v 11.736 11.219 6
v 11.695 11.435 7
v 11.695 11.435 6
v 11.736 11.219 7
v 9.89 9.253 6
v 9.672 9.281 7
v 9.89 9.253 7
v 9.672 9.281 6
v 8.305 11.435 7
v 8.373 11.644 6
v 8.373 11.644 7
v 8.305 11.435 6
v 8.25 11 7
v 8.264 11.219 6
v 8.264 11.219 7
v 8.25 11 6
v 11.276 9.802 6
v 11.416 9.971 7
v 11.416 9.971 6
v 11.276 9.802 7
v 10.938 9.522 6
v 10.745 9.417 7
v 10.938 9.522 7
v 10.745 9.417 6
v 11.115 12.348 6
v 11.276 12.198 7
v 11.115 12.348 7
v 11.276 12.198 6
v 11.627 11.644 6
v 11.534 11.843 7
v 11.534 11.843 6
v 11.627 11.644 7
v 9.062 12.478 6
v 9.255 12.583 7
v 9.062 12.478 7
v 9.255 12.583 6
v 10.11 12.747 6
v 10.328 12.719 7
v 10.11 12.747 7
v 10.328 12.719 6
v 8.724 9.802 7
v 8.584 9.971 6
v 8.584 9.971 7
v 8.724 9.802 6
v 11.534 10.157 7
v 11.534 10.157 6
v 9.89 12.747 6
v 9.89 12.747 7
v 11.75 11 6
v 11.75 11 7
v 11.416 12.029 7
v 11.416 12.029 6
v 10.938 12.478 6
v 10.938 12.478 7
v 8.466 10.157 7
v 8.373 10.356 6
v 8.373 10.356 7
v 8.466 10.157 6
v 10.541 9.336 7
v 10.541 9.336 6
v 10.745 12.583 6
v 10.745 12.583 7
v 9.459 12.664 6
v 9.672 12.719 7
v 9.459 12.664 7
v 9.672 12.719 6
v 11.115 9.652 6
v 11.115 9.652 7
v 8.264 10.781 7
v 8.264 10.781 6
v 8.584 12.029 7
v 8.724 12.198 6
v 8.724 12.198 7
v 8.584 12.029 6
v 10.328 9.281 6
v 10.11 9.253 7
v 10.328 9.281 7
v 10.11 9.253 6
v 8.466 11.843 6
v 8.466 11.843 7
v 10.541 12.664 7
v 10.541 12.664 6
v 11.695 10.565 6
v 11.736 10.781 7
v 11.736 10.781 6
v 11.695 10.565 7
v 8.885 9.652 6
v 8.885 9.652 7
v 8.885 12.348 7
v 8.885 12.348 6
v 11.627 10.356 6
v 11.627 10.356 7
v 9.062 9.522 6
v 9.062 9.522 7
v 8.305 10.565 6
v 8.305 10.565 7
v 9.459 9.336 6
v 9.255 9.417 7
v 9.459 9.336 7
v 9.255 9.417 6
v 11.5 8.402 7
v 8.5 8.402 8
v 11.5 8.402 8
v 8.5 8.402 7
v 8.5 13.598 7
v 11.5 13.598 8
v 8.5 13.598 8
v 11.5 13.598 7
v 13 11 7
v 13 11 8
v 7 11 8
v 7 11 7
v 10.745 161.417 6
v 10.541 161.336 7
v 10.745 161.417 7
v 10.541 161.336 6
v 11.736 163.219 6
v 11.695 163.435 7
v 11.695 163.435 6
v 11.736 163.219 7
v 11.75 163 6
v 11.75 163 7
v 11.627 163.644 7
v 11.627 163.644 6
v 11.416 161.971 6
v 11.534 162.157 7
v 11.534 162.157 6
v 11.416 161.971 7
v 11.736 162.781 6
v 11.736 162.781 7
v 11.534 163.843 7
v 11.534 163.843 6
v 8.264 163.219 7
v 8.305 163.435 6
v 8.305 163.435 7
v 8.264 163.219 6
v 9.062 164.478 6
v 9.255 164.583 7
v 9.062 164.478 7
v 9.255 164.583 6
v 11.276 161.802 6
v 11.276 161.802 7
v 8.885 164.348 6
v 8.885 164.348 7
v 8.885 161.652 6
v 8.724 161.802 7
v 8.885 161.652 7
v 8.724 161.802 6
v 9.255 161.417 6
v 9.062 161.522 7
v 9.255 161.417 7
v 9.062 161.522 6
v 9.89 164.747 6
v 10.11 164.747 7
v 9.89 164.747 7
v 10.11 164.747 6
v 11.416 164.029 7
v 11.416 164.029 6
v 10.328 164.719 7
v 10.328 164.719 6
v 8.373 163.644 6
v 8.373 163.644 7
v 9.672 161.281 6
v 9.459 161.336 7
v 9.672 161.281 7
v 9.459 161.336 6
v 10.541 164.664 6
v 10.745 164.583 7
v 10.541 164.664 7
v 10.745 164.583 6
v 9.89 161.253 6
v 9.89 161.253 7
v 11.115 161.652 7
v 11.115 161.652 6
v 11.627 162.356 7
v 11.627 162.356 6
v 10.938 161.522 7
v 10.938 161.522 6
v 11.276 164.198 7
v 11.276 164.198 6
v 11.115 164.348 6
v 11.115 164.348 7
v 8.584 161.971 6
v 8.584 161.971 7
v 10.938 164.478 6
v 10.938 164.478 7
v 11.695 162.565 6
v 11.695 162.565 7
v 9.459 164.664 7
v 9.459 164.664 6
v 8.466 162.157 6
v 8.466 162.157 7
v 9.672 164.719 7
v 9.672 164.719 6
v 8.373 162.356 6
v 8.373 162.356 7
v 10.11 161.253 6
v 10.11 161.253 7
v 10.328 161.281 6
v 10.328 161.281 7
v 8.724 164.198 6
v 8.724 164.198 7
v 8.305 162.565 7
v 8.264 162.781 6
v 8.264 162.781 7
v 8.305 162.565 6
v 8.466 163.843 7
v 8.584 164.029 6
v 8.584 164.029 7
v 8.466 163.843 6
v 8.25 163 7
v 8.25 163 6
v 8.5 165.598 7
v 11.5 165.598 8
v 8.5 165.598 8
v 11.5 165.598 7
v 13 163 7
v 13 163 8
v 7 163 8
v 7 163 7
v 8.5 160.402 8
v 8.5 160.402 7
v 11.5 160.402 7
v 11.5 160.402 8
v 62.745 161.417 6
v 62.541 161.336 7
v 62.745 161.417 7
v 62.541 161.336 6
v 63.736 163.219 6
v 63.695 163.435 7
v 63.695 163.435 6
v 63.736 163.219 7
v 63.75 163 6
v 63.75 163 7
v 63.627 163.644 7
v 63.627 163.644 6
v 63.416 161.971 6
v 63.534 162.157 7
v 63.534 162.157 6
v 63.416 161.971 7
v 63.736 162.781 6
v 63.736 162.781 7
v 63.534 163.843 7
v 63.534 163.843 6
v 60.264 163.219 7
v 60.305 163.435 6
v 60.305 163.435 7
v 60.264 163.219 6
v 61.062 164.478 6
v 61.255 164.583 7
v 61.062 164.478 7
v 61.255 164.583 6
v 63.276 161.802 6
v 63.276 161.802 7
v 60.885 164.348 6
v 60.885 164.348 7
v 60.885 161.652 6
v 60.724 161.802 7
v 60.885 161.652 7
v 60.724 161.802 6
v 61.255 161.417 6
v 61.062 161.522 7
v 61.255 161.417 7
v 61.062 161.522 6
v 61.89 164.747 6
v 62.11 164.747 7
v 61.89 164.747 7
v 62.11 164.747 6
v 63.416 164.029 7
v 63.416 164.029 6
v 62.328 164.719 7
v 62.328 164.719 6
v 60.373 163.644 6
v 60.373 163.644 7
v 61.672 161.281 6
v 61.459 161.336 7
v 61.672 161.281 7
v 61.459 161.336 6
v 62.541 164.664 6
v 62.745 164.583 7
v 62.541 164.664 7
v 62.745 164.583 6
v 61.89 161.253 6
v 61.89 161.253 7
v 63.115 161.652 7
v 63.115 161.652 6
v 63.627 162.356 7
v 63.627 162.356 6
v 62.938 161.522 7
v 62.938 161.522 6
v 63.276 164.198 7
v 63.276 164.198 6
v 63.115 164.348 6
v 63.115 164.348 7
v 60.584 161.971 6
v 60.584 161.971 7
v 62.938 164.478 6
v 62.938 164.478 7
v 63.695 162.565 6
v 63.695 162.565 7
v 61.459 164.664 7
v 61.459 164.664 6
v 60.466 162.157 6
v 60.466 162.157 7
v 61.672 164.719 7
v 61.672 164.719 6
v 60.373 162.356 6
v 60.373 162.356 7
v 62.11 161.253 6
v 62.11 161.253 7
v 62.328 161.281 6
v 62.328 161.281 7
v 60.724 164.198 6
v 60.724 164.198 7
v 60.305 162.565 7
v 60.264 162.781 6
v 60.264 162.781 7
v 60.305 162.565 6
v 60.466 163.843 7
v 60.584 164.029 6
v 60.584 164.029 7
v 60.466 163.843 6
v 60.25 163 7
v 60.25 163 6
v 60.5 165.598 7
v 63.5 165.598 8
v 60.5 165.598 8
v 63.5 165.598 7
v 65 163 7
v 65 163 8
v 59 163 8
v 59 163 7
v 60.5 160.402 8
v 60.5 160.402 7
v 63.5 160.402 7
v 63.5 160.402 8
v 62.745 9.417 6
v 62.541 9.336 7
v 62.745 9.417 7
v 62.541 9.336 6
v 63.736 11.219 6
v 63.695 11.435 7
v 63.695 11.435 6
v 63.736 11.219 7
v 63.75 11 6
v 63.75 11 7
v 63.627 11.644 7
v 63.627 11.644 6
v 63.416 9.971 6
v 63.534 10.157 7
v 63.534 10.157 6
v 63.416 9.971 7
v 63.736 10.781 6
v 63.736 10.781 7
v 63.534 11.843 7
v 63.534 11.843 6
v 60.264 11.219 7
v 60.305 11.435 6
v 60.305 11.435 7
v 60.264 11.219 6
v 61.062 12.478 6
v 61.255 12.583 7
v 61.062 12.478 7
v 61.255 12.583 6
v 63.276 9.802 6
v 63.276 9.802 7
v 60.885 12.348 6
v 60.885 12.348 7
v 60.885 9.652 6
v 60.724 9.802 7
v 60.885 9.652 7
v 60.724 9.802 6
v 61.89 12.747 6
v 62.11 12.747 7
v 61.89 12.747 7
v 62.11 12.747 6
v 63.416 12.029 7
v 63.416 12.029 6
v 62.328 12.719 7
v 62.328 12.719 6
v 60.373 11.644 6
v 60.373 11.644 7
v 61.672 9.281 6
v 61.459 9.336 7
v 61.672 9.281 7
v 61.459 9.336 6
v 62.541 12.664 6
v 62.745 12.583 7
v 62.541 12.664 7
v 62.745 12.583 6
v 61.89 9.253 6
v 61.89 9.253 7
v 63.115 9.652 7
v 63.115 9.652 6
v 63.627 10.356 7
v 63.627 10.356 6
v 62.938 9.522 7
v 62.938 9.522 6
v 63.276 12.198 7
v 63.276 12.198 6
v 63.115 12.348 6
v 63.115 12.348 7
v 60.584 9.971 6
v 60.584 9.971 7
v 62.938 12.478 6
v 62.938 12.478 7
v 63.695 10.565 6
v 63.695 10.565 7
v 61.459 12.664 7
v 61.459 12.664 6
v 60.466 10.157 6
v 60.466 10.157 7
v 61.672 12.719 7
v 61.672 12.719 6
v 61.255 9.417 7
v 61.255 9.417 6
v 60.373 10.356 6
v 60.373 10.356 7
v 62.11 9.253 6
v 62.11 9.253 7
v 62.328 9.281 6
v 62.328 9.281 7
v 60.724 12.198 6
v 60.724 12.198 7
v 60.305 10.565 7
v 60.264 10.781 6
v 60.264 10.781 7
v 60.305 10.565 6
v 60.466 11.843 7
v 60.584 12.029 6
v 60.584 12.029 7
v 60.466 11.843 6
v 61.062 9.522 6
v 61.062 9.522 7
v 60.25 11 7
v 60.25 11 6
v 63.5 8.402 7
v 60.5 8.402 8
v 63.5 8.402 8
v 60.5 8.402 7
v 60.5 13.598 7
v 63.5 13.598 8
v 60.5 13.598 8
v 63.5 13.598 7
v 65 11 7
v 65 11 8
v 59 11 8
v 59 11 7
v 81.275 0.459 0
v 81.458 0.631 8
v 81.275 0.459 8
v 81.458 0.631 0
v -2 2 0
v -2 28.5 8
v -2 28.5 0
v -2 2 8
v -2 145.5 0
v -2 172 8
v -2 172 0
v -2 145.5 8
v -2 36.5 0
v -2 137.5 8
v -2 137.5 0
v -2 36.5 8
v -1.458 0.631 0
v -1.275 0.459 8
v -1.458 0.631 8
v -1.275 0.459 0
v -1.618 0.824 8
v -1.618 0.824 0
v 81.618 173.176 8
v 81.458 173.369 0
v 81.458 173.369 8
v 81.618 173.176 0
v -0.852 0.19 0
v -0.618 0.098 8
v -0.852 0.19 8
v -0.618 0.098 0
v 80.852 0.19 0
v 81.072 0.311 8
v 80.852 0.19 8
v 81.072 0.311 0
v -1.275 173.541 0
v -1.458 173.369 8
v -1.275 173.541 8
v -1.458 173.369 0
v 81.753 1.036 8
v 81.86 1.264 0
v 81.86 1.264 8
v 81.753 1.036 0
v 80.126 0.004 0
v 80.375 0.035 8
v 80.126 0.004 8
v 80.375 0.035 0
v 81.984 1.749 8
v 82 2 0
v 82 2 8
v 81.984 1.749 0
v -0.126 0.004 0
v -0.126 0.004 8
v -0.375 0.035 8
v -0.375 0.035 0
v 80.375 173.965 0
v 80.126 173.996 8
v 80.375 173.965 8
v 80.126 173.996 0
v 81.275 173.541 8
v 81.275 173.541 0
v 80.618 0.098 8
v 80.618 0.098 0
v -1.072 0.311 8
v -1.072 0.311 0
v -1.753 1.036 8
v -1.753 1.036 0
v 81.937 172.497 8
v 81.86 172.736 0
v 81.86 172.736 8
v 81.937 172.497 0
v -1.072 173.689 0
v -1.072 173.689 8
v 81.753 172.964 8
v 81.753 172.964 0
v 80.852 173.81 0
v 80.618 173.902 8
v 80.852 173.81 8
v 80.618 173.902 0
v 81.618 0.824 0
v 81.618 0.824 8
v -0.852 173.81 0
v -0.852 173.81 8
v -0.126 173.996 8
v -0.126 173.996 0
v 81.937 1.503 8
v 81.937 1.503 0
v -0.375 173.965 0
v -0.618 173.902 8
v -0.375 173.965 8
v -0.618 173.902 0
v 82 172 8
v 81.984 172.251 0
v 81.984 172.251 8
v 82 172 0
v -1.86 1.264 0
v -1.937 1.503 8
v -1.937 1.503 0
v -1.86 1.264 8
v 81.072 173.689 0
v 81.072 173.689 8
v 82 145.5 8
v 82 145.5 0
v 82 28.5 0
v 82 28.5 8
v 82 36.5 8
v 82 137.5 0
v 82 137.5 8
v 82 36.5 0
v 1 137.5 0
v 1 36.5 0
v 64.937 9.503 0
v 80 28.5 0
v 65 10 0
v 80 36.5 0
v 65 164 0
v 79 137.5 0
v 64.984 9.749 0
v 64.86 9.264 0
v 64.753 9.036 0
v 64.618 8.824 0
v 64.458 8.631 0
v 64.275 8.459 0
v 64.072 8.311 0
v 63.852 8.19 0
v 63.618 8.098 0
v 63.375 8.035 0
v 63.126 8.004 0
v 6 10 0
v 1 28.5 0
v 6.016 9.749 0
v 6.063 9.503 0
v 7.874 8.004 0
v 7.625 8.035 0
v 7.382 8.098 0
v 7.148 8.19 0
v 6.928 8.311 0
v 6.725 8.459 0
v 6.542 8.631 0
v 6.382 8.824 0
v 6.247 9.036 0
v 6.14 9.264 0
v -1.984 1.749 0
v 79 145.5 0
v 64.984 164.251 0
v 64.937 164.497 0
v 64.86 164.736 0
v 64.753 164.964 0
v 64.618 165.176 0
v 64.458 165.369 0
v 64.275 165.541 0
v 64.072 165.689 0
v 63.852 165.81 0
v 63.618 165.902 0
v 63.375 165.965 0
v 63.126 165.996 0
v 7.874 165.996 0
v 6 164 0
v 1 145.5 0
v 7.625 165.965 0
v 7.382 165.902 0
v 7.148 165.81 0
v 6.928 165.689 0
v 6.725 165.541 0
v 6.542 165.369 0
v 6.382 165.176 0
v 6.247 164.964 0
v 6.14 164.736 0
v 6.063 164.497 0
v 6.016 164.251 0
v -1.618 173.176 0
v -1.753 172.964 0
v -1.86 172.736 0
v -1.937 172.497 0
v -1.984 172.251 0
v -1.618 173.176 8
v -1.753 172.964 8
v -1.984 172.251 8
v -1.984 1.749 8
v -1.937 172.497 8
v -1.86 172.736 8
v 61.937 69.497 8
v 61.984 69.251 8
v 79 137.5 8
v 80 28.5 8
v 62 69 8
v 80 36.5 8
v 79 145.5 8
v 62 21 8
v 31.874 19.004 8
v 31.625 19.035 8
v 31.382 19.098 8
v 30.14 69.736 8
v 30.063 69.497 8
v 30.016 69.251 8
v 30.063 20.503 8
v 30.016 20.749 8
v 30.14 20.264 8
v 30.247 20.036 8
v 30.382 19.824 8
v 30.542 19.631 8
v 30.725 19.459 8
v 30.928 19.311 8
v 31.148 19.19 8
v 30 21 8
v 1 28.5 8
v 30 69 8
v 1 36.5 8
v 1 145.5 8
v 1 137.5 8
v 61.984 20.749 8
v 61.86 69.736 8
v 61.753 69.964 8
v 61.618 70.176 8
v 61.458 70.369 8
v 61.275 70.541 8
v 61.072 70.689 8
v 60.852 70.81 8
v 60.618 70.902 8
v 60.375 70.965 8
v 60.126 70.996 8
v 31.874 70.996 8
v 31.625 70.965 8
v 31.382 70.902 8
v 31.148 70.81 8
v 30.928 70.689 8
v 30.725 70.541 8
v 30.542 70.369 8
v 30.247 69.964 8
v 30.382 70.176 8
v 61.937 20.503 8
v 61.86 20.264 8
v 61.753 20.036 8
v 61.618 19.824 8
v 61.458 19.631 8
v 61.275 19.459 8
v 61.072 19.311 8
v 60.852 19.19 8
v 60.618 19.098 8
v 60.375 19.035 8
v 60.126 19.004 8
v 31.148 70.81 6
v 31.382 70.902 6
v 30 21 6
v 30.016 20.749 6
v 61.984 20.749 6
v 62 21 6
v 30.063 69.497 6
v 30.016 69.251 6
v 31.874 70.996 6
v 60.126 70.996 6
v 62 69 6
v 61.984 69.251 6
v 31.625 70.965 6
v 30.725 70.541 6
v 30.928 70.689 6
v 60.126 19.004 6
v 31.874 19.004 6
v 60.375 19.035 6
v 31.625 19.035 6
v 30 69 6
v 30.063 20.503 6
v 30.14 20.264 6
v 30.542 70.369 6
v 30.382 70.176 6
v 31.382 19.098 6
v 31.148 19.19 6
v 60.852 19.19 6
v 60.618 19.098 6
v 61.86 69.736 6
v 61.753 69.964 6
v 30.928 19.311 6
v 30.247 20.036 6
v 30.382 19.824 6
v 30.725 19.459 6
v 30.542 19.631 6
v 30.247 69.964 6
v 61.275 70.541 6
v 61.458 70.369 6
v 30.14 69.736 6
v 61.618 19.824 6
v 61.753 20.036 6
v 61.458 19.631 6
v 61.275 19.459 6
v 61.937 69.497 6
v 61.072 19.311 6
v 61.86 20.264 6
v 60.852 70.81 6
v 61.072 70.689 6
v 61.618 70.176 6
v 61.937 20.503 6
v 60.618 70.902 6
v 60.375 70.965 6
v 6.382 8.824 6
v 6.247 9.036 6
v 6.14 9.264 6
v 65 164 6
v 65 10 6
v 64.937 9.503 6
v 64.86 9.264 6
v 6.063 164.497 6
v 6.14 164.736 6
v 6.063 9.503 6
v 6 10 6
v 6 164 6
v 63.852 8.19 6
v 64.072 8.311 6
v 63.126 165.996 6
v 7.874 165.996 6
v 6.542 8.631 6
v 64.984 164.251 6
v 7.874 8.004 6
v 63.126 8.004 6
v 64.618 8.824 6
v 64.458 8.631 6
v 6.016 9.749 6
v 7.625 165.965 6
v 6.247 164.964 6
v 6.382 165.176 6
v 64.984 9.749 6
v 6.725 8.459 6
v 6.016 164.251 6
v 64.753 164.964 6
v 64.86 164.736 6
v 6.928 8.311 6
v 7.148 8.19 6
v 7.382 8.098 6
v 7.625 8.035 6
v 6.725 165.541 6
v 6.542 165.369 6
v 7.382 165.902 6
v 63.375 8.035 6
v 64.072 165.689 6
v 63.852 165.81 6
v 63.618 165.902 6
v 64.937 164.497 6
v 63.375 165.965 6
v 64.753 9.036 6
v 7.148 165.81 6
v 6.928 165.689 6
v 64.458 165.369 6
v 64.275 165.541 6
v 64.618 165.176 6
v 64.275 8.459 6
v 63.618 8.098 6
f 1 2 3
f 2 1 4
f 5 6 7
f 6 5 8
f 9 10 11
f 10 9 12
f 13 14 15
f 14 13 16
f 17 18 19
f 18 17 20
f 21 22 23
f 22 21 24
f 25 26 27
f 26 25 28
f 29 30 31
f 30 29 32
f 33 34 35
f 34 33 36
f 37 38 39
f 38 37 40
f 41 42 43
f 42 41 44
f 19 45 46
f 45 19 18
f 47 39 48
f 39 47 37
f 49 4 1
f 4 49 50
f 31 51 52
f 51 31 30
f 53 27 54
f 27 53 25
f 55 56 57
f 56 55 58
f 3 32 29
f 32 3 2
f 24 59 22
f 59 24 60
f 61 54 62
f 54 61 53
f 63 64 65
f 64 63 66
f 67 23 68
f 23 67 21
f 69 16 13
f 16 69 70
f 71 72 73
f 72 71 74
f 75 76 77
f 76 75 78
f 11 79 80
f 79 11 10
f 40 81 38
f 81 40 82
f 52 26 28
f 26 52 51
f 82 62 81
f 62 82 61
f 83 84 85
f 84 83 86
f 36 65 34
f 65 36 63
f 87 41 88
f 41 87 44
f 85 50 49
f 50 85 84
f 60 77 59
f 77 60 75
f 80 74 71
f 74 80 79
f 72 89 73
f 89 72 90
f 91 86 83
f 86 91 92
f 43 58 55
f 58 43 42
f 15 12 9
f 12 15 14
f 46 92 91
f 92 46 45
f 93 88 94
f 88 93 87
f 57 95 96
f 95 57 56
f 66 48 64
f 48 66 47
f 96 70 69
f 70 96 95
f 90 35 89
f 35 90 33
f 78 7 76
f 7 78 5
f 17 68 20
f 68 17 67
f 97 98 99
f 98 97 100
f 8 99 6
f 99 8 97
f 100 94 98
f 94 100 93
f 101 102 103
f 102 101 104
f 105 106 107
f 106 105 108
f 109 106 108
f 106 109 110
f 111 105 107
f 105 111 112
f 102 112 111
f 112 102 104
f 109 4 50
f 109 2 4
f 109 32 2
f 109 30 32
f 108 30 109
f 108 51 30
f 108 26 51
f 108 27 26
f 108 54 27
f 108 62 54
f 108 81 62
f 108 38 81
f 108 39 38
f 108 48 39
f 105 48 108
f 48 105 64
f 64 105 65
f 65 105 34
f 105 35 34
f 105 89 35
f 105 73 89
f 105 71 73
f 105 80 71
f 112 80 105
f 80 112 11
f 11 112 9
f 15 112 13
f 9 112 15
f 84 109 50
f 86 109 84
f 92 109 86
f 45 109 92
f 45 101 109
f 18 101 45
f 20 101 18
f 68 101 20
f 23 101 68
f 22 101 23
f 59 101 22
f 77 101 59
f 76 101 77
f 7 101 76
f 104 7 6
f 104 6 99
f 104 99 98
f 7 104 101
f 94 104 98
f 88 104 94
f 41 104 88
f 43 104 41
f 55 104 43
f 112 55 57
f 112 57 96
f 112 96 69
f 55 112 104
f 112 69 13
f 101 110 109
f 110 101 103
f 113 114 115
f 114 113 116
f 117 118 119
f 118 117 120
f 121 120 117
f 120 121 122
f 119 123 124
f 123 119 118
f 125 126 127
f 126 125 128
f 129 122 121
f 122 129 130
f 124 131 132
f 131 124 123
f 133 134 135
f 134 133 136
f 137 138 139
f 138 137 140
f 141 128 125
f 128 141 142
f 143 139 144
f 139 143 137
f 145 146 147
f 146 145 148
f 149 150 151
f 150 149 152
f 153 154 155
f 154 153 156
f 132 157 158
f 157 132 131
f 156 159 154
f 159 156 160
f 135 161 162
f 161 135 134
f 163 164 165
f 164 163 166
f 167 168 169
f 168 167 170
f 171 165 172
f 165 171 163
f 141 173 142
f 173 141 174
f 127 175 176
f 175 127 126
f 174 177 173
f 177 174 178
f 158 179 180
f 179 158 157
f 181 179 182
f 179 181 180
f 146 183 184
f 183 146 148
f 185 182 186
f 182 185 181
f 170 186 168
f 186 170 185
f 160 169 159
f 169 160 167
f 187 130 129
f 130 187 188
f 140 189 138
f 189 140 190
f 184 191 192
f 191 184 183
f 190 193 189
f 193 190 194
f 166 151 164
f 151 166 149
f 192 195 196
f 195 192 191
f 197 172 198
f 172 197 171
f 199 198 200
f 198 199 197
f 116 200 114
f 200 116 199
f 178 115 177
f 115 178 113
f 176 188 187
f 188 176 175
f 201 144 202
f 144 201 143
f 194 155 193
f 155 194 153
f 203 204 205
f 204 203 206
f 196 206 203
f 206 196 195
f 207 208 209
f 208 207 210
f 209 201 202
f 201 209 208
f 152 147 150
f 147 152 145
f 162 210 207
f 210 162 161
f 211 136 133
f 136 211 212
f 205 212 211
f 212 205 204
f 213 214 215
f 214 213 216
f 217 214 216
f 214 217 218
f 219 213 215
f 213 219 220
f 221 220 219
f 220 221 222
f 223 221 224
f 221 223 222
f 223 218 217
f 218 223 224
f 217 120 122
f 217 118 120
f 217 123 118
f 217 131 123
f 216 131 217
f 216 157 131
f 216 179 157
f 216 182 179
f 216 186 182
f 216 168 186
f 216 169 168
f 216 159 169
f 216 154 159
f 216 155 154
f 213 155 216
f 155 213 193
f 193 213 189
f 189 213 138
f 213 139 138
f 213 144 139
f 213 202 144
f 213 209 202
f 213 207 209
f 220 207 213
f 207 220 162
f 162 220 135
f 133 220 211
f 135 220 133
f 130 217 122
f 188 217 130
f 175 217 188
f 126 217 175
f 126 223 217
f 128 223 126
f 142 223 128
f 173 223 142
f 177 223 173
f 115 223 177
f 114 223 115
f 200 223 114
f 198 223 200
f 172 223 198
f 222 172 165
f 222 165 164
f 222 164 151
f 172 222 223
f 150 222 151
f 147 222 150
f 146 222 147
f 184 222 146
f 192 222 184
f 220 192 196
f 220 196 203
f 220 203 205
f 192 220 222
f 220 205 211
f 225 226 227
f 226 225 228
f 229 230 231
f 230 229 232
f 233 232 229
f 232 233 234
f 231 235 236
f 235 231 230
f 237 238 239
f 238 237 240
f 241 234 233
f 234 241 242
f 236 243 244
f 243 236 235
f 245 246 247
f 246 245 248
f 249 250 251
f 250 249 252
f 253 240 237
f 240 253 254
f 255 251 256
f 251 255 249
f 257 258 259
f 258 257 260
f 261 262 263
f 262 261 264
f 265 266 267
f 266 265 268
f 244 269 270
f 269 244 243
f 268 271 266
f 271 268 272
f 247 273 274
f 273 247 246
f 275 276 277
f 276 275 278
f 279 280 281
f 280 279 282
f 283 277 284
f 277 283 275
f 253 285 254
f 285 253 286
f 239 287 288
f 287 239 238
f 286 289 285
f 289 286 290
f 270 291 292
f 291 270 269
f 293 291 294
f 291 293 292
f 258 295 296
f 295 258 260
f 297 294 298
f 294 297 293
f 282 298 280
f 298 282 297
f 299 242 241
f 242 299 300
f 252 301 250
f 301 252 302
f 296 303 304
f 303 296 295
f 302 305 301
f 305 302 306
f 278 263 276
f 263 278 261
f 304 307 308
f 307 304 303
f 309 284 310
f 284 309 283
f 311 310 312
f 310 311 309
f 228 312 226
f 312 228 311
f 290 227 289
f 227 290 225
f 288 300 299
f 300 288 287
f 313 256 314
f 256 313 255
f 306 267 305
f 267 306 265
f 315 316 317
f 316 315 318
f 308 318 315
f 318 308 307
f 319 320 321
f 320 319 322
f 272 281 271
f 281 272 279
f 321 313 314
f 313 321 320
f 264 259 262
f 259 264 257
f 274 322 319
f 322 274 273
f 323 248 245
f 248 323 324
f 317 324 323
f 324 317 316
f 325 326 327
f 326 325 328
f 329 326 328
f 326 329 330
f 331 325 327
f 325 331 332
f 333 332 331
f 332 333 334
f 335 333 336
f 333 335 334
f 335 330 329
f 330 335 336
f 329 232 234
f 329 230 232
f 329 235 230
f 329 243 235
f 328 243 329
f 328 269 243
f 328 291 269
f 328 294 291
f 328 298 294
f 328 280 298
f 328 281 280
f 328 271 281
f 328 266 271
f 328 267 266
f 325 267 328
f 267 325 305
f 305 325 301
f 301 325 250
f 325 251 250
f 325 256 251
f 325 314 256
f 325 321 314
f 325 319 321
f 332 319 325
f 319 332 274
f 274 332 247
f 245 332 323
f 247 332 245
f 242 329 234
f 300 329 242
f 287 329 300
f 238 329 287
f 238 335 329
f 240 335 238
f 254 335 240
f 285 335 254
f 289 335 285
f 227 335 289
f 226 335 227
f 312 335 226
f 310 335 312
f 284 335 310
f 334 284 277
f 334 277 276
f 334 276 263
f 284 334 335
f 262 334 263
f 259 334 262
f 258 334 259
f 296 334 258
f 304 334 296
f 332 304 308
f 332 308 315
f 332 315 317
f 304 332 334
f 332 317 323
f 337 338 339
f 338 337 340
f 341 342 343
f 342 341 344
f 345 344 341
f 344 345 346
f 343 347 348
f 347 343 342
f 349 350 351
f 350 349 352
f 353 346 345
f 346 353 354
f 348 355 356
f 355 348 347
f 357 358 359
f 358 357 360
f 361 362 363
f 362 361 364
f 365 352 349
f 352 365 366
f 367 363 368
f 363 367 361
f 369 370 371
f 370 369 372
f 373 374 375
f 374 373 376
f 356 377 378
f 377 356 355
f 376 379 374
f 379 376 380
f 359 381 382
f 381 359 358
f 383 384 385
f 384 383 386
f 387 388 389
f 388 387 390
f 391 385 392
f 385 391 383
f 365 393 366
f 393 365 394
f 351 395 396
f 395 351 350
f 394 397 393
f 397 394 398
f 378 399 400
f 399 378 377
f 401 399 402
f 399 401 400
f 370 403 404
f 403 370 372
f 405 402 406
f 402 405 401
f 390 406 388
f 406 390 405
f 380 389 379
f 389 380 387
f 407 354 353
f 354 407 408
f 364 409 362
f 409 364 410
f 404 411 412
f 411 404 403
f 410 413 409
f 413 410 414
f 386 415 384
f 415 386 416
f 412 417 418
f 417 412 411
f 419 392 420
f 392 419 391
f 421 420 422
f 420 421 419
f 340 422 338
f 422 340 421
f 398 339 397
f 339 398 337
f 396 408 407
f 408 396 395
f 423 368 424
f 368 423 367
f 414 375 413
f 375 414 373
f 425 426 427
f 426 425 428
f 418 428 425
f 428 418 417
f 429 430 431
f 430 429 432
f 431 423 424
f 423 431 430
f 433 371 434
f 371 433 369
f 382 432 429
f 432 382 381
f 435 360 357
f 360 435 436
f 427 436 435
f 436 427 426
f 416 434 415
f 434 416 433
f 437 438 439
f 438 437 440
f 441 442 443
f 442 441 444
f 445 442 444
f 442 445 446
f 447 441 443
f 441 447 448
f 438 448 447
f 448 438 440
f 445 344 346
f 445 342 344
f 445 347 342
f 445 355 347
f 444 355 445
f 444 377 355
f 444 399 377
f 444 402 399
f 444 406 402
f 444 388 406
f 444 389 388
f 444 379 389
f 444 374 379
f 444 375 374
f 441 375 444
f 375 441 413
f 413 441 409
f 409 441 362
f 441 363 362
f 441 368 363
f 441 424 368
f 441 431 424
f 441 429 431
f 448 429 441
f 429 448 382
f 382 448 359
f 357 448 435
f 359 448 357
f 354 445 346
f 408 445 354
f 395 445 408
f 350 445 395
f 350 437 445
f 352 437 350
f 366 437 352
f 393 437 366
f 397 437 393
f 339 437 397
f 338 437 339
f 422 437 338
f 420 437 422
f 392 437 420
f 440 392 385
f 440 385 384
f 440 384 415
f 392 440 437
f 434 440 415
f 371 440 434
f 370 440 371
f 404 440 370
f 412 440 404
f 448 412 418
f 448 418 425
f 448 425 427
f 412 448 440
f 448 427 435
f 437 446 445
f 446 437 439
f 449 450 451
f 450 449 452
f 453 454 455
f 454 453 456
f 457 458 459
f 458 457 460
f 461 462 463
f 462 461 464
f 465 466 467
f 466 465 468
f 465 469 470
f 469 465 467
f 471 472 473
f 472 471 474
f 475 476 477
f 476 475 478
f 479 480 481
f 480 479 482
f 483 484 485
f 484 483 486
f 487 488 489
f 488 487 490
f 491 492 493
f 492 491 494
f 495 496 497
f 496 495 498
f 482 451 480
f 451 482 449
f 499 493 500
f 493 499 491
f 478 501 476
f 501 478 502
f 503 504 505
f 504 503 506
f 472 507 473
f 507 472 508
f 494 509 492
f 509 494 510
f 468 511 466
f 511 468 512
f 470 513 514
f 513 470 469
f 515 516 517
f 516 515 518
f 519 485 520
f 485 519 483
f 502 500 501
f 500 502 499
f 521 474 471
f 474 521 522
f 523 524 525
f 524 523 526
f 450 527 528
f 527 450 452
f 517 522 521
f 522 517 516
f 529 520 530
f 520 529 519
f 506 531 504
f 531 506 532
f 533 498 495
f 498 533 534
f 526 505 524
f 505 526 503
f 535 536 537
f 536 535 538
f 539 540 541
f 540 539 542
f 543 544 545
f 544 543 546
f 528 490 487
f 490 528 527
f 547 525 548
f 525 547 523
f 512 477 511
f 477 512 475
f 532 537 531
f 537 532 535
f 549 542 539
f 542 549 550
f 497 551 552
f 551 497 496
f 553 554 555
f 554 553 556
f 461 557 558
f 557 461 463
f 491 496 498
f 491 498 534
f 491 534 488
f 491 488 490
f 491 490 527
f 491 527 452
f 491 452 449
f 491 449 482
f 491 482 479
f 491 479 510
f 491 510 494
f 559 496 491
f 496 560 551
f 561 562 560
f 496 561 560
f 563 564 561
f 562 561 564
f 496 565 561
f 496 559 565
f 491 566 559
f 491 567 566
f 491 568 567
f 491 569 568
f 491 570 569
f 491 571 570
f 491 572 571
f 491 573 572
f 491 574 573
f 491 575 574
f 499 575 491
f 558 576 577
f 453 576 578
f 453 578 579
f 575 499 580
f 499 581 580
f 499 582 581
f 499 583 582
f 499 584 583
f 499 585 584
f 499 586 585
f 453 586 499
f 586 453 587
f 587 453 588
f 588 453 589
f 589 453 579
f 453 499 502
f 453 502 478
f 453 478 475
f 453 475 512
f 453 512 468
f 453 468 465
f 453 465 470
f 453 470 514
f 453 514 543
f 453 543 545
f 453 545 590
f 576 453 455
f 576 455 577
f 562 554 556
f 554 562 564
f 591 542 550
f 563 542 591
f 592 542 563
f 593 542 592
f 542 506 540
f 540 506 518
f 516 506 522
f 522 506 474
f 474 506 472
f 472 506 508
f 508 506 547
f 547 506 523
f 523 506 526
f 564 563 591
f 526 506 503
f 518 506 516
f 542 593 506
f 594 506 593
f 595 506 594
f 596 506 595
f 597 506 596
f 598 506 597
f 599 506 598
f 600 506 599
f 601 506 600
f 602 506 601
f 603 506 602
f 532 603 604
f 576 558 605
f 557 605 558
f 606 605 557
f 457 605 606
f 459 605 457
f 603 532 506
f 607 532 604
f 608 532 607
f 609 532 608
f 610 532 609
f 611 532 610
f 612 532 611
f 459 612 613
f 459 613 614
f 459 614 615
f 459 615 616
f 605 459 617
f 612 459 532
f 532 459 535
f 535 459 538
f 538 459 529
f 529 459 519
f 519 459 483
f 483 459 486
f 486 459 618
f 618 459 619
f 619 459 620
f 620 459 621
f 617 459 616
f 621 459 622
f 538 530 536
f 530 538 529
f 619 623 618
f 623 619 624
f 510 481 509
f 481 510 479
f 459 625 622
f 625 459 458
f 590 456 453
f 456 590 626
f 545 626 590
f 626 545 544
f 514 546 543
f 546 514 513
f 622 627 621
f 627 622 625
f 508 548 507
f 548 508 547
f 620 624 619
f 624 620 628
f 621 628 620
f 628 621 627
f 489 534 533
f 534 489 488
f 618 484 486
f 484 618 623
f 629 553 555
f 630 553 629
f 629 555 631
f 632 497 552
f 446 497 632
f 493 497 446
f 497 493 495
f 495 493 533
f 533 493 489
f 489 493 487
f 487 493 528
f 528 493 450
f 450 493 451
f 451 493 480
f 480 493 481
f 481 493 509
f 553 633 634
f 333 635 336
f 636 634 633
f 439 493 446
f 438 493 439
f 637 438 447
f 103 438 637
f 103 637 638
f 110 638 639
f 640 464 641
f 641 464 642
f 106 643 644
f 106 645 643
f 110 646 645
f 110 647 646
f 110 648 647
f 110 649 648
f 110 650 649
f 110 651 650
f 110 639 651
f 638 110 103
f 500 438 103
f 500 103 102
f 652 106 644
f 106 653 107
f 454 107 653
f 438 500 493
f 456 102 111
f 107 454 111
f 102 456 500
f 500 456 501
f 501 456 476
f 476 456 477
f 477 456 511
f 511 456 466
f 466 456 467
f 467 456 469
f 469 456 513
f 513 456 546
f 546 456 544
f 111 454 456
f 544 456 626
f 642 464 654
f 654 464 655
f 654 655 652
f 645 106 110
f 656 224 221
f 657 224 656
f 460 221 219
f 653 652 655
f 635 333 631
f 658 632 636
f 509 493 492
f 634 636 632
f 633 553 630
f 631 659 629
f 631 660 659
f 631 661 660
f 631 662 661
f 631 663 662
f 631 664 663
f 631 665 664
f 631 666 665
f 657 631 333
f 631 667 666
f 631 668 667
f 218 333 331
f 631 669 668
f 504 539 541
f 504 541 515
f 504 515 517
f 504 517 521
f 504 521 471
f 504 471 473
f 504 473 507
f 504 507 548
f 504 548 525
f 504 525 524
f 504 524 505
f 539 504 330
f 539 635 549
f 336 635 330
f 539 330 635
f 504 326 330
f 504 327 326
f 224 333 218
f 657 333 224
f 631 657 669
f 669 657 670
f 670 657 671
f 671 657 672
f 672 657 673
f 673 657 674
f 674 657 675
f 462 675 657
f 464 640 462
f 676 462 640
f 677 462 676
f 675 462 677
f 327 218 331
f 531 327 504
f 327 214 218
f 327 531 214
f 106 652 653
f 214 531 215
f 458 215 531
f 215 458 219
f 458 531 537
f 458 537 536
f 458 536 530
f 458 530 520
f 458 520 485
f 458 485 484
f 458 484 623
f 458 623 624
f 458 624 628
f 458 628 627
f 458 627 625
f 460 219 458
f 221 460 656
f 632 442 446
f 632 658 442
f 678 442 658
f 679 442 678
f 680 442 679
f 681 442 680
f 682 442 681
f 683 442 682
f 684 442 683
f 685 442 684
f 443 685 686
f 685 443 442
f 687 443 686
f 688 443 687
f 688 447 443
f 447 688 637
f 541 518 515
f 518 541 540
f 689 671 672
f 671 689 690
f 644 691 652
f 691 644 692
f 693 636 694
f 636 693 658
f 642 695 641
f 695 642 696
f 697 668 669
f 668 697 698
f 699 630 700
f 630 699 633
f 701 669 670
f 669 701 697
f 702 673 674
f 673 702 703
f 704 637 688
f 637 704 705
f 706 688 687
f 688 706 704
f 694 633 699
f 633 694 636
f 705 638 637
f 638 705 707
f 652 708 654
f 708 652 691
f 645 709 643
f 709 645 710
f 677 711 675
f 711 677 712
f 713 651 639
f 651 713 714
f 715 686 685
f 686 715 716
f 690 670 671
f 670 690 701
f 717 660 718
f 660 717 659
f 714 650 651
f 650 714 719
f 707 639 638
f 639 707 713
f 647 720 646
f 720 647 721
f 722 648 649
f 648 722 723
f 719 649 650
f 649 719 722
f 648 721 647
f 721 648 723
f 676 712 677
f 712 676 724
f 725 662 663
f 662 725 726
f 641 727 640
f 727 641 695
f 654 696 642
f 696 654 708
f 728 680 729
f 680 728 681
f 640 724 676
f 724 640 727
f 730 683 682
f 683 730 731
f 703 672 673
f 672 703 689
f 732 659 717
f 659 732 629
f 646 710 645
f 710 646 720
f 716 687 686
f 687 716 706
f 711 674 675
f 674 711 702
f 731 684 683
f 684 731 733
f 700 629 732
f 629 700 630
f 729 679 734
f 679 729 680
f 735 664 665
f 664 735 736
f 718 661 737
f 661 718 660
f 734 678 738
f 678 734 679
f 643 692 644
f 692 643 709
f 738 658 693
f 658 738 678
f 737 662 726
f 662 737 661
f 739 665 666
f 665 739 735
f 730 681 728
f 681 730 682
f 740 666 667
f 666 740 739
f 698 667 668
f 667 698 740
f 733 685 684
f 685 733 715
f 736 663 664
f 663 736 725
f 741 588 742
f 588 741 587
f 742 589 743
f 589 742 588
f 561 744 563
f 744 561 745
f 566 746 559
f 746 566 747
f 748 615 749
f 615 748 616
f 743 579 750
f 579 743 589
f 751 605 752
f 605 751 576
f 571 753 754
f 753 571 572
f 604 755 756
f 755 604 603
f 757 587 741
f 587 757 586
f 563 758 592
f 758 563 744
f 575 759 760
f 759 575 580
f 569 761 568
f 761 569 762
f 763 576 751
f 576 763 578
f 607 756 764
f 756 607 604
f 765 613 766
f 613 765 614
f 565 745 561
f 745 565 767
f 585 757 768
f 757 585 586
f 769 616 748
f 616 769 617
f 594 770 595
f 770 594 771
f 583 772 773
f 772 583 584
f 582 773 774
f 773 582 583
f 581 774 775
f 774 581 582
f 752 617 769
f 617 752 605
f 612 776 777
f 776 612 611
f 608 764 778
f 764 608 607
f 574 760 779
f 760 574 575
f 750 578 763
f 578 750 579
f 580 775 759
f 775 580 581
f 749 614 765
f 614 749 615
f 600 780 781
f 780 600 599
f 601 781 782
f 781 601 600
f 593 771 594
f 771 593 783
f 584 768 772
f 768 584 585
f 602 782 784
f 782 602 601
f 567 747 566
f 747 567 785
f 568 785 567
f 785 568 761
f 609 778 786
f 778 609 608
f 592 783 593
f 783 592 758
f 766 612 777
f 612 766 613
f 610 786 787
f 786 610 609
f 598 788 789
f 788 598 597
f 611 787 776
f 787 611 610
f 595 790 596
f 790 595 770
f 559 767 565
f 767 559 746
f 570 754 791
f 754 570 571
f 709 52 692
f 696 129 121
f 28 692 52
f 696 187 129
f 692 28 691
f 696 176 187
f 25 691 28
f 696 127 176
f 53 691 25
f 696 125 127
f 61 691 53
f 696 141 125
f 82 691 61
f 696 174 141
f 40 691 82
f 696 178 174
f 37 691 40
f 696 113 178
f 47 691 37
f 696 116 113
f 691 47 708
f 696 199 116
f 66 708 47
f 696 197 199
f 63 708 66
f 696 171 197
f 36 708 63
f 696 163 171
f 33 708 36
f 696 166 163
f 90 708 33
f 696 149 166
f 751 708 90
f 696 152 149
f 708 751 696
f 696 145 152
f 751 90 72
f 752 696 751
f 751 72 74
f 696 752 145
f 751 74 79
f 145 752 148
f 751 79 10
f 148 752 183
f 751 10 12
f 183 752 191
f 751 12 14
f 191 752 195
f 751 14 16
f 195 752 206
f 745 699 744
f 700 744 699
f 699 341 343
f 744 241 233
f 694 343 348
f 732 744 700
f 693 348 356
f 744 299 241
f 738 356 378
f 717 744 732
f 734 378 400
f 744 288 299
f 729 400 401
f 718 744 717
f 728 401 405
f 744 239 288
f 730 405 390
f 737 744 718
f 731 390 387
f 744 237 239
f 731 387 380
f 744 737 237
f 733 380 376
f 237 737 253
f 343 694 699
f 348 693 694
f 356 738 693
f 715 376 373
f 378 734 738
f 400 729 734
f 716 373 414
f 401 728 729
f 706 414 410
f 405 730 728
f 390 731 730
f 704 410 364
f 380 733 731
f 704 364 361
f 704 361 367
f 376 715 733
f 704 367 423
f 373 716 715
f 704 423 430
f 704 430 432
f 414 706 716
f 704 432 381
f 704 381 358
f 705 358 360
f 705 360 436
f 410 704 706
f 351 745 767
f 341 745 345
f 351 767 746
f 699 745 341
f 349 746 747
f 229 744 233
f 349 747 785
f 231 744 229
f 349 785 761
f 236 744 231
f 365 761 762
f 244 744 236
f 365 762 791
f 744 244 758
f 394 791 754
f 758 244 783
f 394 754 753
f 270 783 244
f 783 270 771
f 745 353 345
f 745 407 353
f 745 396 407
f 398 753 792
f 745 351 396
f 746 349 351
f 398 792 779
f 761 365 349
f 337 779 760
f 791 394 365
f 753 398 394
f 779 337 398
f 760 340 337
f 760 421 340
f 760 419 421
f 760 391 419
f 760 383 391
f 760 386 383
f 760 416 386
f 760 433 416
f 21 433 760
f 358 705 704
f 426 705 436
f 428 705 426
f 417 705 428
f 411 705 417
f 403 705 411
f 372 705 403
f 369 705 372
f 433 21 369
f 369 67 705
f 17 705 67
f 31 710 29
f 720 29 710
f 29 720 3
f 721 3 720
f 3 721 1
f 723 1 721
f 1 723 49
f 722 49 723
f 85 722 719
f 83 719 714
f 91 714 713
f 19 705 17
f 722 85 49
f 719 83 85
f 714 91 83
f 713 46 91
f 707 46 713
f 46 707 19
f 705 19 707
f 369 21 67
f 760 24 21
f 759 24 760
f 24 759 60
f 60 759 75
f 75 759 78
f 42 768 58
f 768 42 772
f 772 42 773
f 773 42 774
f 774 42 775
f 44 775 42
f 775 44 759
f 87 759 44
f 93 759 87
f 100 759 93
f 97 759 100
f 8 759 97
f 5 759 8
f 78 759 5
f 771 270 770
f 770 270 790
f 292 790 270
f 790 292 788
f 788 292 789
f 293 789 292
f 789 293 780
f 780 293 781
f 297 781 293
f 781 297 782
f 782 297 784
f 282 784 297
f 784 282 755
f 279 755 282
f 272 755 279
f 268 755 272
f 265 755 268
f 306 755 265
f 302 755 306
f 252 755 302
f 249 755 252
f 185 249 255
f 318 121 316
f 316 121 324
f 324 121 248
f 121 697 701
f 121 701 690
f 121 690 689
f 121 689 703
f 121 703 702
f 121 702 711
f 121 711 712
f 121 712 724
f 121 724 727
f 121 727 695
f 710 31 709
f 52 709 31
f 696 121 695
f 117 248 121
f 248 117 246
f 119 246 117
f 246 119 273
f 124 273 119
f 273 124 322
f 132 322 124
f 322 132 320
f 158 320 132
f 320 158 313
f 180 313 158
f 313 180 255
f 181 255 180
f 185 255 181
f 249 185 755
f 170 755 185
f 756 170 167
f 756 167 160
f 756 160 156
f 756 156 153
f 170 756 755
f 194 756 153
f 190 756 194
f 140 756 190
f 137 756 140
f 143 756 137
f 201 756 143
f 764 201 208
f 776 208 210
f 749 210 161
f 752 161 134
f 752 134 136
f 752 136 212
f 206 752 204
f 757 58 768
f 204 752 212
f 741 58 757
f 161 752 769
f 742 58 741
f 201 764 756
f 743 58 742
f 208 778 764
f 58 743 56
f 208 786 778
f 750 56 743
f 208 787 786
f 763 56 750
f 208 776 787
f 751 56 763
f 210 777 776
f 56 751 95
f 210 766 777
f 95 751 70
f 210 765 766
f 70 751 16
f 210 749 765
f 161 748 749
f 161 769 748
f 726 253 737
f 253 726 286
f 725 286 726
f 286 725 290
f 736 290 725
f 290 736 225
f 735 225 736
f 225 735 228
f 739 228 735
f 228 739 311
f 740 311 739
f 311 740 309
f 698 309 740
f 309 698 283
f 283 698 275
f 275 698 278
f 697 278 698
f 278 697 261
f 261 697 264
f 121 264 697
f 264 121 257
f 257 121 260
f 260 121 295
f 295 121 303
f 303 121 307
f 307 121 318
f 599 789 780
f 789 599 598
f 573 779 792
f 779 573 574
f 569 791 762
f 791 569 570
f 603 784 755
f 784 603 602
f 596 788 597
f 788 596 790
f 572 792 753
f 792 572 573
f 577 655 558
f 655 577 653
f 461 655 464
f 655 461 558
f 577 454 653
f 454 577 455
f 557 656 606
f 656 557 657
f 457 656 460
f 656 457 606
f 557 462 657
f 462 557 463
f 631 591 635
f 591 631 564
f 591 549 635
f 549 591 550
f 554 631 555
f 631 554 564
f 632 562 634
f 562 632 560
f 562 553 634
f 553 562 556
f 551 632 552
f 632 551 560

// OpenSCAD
 module M3_hole(pos, h) {
     translate(pos-[0,0,1])
     cylinder(r=3.5/2, h+1, $fn=50);
     translate(pos-[0,0,-h+2])
     cylinder(r=6/2, 3, $fn=6);
     
 };
 
 module HolderHole(pos,h) {
     translate(pos-[0,0,1])
     cube([3,8,h+2]);
 }

 $fn=50;
 translate([0,2,0])
 difference(){
     minkowski(){
         cube([80,170,8-4]);
         cylinder(r=2,h=8-4);
     }
     // Viti
     hp1=[10,(170-152)/2,0];
     #M3_hole(hp1,9);
     hp2=hp1+[0,152,0];
     M3_hole(hp2,9);
     hp3=hp1+[52,152,0];
     M3_hole(hp3,9);
     hp4=hp1+[52,0,0];
     M3_hole(hp4,9);
     
     // Buco prese
     translate(hp4+[-30,10,-1]) 
          minkowski(){
            cube([30-2,50-2,10]);
            cylinder(r=2,h=1);
          }
     
     // Busco scheda comandi
     translate(hp1-[2,1,1]) 
          minkowski(){
            cube([55,154,6]);
            cylinder(r=2,h=1);
          }
          
     // Holder hole
    h1 = [-2,(170-101-16)/2,0];      
    HolderHole(h1,8);      
    HolderHole(h1+[0,101+8,0],8);      
    HolderHole(h1+[80+1,101+8,0],8);      
    HolderHole(h1+[80+2,0,0],8);      
          
          
 }
 
 
 // Buchi distanza 152 ( M3 con datro esagonarle) Z distanza est 52.
 
